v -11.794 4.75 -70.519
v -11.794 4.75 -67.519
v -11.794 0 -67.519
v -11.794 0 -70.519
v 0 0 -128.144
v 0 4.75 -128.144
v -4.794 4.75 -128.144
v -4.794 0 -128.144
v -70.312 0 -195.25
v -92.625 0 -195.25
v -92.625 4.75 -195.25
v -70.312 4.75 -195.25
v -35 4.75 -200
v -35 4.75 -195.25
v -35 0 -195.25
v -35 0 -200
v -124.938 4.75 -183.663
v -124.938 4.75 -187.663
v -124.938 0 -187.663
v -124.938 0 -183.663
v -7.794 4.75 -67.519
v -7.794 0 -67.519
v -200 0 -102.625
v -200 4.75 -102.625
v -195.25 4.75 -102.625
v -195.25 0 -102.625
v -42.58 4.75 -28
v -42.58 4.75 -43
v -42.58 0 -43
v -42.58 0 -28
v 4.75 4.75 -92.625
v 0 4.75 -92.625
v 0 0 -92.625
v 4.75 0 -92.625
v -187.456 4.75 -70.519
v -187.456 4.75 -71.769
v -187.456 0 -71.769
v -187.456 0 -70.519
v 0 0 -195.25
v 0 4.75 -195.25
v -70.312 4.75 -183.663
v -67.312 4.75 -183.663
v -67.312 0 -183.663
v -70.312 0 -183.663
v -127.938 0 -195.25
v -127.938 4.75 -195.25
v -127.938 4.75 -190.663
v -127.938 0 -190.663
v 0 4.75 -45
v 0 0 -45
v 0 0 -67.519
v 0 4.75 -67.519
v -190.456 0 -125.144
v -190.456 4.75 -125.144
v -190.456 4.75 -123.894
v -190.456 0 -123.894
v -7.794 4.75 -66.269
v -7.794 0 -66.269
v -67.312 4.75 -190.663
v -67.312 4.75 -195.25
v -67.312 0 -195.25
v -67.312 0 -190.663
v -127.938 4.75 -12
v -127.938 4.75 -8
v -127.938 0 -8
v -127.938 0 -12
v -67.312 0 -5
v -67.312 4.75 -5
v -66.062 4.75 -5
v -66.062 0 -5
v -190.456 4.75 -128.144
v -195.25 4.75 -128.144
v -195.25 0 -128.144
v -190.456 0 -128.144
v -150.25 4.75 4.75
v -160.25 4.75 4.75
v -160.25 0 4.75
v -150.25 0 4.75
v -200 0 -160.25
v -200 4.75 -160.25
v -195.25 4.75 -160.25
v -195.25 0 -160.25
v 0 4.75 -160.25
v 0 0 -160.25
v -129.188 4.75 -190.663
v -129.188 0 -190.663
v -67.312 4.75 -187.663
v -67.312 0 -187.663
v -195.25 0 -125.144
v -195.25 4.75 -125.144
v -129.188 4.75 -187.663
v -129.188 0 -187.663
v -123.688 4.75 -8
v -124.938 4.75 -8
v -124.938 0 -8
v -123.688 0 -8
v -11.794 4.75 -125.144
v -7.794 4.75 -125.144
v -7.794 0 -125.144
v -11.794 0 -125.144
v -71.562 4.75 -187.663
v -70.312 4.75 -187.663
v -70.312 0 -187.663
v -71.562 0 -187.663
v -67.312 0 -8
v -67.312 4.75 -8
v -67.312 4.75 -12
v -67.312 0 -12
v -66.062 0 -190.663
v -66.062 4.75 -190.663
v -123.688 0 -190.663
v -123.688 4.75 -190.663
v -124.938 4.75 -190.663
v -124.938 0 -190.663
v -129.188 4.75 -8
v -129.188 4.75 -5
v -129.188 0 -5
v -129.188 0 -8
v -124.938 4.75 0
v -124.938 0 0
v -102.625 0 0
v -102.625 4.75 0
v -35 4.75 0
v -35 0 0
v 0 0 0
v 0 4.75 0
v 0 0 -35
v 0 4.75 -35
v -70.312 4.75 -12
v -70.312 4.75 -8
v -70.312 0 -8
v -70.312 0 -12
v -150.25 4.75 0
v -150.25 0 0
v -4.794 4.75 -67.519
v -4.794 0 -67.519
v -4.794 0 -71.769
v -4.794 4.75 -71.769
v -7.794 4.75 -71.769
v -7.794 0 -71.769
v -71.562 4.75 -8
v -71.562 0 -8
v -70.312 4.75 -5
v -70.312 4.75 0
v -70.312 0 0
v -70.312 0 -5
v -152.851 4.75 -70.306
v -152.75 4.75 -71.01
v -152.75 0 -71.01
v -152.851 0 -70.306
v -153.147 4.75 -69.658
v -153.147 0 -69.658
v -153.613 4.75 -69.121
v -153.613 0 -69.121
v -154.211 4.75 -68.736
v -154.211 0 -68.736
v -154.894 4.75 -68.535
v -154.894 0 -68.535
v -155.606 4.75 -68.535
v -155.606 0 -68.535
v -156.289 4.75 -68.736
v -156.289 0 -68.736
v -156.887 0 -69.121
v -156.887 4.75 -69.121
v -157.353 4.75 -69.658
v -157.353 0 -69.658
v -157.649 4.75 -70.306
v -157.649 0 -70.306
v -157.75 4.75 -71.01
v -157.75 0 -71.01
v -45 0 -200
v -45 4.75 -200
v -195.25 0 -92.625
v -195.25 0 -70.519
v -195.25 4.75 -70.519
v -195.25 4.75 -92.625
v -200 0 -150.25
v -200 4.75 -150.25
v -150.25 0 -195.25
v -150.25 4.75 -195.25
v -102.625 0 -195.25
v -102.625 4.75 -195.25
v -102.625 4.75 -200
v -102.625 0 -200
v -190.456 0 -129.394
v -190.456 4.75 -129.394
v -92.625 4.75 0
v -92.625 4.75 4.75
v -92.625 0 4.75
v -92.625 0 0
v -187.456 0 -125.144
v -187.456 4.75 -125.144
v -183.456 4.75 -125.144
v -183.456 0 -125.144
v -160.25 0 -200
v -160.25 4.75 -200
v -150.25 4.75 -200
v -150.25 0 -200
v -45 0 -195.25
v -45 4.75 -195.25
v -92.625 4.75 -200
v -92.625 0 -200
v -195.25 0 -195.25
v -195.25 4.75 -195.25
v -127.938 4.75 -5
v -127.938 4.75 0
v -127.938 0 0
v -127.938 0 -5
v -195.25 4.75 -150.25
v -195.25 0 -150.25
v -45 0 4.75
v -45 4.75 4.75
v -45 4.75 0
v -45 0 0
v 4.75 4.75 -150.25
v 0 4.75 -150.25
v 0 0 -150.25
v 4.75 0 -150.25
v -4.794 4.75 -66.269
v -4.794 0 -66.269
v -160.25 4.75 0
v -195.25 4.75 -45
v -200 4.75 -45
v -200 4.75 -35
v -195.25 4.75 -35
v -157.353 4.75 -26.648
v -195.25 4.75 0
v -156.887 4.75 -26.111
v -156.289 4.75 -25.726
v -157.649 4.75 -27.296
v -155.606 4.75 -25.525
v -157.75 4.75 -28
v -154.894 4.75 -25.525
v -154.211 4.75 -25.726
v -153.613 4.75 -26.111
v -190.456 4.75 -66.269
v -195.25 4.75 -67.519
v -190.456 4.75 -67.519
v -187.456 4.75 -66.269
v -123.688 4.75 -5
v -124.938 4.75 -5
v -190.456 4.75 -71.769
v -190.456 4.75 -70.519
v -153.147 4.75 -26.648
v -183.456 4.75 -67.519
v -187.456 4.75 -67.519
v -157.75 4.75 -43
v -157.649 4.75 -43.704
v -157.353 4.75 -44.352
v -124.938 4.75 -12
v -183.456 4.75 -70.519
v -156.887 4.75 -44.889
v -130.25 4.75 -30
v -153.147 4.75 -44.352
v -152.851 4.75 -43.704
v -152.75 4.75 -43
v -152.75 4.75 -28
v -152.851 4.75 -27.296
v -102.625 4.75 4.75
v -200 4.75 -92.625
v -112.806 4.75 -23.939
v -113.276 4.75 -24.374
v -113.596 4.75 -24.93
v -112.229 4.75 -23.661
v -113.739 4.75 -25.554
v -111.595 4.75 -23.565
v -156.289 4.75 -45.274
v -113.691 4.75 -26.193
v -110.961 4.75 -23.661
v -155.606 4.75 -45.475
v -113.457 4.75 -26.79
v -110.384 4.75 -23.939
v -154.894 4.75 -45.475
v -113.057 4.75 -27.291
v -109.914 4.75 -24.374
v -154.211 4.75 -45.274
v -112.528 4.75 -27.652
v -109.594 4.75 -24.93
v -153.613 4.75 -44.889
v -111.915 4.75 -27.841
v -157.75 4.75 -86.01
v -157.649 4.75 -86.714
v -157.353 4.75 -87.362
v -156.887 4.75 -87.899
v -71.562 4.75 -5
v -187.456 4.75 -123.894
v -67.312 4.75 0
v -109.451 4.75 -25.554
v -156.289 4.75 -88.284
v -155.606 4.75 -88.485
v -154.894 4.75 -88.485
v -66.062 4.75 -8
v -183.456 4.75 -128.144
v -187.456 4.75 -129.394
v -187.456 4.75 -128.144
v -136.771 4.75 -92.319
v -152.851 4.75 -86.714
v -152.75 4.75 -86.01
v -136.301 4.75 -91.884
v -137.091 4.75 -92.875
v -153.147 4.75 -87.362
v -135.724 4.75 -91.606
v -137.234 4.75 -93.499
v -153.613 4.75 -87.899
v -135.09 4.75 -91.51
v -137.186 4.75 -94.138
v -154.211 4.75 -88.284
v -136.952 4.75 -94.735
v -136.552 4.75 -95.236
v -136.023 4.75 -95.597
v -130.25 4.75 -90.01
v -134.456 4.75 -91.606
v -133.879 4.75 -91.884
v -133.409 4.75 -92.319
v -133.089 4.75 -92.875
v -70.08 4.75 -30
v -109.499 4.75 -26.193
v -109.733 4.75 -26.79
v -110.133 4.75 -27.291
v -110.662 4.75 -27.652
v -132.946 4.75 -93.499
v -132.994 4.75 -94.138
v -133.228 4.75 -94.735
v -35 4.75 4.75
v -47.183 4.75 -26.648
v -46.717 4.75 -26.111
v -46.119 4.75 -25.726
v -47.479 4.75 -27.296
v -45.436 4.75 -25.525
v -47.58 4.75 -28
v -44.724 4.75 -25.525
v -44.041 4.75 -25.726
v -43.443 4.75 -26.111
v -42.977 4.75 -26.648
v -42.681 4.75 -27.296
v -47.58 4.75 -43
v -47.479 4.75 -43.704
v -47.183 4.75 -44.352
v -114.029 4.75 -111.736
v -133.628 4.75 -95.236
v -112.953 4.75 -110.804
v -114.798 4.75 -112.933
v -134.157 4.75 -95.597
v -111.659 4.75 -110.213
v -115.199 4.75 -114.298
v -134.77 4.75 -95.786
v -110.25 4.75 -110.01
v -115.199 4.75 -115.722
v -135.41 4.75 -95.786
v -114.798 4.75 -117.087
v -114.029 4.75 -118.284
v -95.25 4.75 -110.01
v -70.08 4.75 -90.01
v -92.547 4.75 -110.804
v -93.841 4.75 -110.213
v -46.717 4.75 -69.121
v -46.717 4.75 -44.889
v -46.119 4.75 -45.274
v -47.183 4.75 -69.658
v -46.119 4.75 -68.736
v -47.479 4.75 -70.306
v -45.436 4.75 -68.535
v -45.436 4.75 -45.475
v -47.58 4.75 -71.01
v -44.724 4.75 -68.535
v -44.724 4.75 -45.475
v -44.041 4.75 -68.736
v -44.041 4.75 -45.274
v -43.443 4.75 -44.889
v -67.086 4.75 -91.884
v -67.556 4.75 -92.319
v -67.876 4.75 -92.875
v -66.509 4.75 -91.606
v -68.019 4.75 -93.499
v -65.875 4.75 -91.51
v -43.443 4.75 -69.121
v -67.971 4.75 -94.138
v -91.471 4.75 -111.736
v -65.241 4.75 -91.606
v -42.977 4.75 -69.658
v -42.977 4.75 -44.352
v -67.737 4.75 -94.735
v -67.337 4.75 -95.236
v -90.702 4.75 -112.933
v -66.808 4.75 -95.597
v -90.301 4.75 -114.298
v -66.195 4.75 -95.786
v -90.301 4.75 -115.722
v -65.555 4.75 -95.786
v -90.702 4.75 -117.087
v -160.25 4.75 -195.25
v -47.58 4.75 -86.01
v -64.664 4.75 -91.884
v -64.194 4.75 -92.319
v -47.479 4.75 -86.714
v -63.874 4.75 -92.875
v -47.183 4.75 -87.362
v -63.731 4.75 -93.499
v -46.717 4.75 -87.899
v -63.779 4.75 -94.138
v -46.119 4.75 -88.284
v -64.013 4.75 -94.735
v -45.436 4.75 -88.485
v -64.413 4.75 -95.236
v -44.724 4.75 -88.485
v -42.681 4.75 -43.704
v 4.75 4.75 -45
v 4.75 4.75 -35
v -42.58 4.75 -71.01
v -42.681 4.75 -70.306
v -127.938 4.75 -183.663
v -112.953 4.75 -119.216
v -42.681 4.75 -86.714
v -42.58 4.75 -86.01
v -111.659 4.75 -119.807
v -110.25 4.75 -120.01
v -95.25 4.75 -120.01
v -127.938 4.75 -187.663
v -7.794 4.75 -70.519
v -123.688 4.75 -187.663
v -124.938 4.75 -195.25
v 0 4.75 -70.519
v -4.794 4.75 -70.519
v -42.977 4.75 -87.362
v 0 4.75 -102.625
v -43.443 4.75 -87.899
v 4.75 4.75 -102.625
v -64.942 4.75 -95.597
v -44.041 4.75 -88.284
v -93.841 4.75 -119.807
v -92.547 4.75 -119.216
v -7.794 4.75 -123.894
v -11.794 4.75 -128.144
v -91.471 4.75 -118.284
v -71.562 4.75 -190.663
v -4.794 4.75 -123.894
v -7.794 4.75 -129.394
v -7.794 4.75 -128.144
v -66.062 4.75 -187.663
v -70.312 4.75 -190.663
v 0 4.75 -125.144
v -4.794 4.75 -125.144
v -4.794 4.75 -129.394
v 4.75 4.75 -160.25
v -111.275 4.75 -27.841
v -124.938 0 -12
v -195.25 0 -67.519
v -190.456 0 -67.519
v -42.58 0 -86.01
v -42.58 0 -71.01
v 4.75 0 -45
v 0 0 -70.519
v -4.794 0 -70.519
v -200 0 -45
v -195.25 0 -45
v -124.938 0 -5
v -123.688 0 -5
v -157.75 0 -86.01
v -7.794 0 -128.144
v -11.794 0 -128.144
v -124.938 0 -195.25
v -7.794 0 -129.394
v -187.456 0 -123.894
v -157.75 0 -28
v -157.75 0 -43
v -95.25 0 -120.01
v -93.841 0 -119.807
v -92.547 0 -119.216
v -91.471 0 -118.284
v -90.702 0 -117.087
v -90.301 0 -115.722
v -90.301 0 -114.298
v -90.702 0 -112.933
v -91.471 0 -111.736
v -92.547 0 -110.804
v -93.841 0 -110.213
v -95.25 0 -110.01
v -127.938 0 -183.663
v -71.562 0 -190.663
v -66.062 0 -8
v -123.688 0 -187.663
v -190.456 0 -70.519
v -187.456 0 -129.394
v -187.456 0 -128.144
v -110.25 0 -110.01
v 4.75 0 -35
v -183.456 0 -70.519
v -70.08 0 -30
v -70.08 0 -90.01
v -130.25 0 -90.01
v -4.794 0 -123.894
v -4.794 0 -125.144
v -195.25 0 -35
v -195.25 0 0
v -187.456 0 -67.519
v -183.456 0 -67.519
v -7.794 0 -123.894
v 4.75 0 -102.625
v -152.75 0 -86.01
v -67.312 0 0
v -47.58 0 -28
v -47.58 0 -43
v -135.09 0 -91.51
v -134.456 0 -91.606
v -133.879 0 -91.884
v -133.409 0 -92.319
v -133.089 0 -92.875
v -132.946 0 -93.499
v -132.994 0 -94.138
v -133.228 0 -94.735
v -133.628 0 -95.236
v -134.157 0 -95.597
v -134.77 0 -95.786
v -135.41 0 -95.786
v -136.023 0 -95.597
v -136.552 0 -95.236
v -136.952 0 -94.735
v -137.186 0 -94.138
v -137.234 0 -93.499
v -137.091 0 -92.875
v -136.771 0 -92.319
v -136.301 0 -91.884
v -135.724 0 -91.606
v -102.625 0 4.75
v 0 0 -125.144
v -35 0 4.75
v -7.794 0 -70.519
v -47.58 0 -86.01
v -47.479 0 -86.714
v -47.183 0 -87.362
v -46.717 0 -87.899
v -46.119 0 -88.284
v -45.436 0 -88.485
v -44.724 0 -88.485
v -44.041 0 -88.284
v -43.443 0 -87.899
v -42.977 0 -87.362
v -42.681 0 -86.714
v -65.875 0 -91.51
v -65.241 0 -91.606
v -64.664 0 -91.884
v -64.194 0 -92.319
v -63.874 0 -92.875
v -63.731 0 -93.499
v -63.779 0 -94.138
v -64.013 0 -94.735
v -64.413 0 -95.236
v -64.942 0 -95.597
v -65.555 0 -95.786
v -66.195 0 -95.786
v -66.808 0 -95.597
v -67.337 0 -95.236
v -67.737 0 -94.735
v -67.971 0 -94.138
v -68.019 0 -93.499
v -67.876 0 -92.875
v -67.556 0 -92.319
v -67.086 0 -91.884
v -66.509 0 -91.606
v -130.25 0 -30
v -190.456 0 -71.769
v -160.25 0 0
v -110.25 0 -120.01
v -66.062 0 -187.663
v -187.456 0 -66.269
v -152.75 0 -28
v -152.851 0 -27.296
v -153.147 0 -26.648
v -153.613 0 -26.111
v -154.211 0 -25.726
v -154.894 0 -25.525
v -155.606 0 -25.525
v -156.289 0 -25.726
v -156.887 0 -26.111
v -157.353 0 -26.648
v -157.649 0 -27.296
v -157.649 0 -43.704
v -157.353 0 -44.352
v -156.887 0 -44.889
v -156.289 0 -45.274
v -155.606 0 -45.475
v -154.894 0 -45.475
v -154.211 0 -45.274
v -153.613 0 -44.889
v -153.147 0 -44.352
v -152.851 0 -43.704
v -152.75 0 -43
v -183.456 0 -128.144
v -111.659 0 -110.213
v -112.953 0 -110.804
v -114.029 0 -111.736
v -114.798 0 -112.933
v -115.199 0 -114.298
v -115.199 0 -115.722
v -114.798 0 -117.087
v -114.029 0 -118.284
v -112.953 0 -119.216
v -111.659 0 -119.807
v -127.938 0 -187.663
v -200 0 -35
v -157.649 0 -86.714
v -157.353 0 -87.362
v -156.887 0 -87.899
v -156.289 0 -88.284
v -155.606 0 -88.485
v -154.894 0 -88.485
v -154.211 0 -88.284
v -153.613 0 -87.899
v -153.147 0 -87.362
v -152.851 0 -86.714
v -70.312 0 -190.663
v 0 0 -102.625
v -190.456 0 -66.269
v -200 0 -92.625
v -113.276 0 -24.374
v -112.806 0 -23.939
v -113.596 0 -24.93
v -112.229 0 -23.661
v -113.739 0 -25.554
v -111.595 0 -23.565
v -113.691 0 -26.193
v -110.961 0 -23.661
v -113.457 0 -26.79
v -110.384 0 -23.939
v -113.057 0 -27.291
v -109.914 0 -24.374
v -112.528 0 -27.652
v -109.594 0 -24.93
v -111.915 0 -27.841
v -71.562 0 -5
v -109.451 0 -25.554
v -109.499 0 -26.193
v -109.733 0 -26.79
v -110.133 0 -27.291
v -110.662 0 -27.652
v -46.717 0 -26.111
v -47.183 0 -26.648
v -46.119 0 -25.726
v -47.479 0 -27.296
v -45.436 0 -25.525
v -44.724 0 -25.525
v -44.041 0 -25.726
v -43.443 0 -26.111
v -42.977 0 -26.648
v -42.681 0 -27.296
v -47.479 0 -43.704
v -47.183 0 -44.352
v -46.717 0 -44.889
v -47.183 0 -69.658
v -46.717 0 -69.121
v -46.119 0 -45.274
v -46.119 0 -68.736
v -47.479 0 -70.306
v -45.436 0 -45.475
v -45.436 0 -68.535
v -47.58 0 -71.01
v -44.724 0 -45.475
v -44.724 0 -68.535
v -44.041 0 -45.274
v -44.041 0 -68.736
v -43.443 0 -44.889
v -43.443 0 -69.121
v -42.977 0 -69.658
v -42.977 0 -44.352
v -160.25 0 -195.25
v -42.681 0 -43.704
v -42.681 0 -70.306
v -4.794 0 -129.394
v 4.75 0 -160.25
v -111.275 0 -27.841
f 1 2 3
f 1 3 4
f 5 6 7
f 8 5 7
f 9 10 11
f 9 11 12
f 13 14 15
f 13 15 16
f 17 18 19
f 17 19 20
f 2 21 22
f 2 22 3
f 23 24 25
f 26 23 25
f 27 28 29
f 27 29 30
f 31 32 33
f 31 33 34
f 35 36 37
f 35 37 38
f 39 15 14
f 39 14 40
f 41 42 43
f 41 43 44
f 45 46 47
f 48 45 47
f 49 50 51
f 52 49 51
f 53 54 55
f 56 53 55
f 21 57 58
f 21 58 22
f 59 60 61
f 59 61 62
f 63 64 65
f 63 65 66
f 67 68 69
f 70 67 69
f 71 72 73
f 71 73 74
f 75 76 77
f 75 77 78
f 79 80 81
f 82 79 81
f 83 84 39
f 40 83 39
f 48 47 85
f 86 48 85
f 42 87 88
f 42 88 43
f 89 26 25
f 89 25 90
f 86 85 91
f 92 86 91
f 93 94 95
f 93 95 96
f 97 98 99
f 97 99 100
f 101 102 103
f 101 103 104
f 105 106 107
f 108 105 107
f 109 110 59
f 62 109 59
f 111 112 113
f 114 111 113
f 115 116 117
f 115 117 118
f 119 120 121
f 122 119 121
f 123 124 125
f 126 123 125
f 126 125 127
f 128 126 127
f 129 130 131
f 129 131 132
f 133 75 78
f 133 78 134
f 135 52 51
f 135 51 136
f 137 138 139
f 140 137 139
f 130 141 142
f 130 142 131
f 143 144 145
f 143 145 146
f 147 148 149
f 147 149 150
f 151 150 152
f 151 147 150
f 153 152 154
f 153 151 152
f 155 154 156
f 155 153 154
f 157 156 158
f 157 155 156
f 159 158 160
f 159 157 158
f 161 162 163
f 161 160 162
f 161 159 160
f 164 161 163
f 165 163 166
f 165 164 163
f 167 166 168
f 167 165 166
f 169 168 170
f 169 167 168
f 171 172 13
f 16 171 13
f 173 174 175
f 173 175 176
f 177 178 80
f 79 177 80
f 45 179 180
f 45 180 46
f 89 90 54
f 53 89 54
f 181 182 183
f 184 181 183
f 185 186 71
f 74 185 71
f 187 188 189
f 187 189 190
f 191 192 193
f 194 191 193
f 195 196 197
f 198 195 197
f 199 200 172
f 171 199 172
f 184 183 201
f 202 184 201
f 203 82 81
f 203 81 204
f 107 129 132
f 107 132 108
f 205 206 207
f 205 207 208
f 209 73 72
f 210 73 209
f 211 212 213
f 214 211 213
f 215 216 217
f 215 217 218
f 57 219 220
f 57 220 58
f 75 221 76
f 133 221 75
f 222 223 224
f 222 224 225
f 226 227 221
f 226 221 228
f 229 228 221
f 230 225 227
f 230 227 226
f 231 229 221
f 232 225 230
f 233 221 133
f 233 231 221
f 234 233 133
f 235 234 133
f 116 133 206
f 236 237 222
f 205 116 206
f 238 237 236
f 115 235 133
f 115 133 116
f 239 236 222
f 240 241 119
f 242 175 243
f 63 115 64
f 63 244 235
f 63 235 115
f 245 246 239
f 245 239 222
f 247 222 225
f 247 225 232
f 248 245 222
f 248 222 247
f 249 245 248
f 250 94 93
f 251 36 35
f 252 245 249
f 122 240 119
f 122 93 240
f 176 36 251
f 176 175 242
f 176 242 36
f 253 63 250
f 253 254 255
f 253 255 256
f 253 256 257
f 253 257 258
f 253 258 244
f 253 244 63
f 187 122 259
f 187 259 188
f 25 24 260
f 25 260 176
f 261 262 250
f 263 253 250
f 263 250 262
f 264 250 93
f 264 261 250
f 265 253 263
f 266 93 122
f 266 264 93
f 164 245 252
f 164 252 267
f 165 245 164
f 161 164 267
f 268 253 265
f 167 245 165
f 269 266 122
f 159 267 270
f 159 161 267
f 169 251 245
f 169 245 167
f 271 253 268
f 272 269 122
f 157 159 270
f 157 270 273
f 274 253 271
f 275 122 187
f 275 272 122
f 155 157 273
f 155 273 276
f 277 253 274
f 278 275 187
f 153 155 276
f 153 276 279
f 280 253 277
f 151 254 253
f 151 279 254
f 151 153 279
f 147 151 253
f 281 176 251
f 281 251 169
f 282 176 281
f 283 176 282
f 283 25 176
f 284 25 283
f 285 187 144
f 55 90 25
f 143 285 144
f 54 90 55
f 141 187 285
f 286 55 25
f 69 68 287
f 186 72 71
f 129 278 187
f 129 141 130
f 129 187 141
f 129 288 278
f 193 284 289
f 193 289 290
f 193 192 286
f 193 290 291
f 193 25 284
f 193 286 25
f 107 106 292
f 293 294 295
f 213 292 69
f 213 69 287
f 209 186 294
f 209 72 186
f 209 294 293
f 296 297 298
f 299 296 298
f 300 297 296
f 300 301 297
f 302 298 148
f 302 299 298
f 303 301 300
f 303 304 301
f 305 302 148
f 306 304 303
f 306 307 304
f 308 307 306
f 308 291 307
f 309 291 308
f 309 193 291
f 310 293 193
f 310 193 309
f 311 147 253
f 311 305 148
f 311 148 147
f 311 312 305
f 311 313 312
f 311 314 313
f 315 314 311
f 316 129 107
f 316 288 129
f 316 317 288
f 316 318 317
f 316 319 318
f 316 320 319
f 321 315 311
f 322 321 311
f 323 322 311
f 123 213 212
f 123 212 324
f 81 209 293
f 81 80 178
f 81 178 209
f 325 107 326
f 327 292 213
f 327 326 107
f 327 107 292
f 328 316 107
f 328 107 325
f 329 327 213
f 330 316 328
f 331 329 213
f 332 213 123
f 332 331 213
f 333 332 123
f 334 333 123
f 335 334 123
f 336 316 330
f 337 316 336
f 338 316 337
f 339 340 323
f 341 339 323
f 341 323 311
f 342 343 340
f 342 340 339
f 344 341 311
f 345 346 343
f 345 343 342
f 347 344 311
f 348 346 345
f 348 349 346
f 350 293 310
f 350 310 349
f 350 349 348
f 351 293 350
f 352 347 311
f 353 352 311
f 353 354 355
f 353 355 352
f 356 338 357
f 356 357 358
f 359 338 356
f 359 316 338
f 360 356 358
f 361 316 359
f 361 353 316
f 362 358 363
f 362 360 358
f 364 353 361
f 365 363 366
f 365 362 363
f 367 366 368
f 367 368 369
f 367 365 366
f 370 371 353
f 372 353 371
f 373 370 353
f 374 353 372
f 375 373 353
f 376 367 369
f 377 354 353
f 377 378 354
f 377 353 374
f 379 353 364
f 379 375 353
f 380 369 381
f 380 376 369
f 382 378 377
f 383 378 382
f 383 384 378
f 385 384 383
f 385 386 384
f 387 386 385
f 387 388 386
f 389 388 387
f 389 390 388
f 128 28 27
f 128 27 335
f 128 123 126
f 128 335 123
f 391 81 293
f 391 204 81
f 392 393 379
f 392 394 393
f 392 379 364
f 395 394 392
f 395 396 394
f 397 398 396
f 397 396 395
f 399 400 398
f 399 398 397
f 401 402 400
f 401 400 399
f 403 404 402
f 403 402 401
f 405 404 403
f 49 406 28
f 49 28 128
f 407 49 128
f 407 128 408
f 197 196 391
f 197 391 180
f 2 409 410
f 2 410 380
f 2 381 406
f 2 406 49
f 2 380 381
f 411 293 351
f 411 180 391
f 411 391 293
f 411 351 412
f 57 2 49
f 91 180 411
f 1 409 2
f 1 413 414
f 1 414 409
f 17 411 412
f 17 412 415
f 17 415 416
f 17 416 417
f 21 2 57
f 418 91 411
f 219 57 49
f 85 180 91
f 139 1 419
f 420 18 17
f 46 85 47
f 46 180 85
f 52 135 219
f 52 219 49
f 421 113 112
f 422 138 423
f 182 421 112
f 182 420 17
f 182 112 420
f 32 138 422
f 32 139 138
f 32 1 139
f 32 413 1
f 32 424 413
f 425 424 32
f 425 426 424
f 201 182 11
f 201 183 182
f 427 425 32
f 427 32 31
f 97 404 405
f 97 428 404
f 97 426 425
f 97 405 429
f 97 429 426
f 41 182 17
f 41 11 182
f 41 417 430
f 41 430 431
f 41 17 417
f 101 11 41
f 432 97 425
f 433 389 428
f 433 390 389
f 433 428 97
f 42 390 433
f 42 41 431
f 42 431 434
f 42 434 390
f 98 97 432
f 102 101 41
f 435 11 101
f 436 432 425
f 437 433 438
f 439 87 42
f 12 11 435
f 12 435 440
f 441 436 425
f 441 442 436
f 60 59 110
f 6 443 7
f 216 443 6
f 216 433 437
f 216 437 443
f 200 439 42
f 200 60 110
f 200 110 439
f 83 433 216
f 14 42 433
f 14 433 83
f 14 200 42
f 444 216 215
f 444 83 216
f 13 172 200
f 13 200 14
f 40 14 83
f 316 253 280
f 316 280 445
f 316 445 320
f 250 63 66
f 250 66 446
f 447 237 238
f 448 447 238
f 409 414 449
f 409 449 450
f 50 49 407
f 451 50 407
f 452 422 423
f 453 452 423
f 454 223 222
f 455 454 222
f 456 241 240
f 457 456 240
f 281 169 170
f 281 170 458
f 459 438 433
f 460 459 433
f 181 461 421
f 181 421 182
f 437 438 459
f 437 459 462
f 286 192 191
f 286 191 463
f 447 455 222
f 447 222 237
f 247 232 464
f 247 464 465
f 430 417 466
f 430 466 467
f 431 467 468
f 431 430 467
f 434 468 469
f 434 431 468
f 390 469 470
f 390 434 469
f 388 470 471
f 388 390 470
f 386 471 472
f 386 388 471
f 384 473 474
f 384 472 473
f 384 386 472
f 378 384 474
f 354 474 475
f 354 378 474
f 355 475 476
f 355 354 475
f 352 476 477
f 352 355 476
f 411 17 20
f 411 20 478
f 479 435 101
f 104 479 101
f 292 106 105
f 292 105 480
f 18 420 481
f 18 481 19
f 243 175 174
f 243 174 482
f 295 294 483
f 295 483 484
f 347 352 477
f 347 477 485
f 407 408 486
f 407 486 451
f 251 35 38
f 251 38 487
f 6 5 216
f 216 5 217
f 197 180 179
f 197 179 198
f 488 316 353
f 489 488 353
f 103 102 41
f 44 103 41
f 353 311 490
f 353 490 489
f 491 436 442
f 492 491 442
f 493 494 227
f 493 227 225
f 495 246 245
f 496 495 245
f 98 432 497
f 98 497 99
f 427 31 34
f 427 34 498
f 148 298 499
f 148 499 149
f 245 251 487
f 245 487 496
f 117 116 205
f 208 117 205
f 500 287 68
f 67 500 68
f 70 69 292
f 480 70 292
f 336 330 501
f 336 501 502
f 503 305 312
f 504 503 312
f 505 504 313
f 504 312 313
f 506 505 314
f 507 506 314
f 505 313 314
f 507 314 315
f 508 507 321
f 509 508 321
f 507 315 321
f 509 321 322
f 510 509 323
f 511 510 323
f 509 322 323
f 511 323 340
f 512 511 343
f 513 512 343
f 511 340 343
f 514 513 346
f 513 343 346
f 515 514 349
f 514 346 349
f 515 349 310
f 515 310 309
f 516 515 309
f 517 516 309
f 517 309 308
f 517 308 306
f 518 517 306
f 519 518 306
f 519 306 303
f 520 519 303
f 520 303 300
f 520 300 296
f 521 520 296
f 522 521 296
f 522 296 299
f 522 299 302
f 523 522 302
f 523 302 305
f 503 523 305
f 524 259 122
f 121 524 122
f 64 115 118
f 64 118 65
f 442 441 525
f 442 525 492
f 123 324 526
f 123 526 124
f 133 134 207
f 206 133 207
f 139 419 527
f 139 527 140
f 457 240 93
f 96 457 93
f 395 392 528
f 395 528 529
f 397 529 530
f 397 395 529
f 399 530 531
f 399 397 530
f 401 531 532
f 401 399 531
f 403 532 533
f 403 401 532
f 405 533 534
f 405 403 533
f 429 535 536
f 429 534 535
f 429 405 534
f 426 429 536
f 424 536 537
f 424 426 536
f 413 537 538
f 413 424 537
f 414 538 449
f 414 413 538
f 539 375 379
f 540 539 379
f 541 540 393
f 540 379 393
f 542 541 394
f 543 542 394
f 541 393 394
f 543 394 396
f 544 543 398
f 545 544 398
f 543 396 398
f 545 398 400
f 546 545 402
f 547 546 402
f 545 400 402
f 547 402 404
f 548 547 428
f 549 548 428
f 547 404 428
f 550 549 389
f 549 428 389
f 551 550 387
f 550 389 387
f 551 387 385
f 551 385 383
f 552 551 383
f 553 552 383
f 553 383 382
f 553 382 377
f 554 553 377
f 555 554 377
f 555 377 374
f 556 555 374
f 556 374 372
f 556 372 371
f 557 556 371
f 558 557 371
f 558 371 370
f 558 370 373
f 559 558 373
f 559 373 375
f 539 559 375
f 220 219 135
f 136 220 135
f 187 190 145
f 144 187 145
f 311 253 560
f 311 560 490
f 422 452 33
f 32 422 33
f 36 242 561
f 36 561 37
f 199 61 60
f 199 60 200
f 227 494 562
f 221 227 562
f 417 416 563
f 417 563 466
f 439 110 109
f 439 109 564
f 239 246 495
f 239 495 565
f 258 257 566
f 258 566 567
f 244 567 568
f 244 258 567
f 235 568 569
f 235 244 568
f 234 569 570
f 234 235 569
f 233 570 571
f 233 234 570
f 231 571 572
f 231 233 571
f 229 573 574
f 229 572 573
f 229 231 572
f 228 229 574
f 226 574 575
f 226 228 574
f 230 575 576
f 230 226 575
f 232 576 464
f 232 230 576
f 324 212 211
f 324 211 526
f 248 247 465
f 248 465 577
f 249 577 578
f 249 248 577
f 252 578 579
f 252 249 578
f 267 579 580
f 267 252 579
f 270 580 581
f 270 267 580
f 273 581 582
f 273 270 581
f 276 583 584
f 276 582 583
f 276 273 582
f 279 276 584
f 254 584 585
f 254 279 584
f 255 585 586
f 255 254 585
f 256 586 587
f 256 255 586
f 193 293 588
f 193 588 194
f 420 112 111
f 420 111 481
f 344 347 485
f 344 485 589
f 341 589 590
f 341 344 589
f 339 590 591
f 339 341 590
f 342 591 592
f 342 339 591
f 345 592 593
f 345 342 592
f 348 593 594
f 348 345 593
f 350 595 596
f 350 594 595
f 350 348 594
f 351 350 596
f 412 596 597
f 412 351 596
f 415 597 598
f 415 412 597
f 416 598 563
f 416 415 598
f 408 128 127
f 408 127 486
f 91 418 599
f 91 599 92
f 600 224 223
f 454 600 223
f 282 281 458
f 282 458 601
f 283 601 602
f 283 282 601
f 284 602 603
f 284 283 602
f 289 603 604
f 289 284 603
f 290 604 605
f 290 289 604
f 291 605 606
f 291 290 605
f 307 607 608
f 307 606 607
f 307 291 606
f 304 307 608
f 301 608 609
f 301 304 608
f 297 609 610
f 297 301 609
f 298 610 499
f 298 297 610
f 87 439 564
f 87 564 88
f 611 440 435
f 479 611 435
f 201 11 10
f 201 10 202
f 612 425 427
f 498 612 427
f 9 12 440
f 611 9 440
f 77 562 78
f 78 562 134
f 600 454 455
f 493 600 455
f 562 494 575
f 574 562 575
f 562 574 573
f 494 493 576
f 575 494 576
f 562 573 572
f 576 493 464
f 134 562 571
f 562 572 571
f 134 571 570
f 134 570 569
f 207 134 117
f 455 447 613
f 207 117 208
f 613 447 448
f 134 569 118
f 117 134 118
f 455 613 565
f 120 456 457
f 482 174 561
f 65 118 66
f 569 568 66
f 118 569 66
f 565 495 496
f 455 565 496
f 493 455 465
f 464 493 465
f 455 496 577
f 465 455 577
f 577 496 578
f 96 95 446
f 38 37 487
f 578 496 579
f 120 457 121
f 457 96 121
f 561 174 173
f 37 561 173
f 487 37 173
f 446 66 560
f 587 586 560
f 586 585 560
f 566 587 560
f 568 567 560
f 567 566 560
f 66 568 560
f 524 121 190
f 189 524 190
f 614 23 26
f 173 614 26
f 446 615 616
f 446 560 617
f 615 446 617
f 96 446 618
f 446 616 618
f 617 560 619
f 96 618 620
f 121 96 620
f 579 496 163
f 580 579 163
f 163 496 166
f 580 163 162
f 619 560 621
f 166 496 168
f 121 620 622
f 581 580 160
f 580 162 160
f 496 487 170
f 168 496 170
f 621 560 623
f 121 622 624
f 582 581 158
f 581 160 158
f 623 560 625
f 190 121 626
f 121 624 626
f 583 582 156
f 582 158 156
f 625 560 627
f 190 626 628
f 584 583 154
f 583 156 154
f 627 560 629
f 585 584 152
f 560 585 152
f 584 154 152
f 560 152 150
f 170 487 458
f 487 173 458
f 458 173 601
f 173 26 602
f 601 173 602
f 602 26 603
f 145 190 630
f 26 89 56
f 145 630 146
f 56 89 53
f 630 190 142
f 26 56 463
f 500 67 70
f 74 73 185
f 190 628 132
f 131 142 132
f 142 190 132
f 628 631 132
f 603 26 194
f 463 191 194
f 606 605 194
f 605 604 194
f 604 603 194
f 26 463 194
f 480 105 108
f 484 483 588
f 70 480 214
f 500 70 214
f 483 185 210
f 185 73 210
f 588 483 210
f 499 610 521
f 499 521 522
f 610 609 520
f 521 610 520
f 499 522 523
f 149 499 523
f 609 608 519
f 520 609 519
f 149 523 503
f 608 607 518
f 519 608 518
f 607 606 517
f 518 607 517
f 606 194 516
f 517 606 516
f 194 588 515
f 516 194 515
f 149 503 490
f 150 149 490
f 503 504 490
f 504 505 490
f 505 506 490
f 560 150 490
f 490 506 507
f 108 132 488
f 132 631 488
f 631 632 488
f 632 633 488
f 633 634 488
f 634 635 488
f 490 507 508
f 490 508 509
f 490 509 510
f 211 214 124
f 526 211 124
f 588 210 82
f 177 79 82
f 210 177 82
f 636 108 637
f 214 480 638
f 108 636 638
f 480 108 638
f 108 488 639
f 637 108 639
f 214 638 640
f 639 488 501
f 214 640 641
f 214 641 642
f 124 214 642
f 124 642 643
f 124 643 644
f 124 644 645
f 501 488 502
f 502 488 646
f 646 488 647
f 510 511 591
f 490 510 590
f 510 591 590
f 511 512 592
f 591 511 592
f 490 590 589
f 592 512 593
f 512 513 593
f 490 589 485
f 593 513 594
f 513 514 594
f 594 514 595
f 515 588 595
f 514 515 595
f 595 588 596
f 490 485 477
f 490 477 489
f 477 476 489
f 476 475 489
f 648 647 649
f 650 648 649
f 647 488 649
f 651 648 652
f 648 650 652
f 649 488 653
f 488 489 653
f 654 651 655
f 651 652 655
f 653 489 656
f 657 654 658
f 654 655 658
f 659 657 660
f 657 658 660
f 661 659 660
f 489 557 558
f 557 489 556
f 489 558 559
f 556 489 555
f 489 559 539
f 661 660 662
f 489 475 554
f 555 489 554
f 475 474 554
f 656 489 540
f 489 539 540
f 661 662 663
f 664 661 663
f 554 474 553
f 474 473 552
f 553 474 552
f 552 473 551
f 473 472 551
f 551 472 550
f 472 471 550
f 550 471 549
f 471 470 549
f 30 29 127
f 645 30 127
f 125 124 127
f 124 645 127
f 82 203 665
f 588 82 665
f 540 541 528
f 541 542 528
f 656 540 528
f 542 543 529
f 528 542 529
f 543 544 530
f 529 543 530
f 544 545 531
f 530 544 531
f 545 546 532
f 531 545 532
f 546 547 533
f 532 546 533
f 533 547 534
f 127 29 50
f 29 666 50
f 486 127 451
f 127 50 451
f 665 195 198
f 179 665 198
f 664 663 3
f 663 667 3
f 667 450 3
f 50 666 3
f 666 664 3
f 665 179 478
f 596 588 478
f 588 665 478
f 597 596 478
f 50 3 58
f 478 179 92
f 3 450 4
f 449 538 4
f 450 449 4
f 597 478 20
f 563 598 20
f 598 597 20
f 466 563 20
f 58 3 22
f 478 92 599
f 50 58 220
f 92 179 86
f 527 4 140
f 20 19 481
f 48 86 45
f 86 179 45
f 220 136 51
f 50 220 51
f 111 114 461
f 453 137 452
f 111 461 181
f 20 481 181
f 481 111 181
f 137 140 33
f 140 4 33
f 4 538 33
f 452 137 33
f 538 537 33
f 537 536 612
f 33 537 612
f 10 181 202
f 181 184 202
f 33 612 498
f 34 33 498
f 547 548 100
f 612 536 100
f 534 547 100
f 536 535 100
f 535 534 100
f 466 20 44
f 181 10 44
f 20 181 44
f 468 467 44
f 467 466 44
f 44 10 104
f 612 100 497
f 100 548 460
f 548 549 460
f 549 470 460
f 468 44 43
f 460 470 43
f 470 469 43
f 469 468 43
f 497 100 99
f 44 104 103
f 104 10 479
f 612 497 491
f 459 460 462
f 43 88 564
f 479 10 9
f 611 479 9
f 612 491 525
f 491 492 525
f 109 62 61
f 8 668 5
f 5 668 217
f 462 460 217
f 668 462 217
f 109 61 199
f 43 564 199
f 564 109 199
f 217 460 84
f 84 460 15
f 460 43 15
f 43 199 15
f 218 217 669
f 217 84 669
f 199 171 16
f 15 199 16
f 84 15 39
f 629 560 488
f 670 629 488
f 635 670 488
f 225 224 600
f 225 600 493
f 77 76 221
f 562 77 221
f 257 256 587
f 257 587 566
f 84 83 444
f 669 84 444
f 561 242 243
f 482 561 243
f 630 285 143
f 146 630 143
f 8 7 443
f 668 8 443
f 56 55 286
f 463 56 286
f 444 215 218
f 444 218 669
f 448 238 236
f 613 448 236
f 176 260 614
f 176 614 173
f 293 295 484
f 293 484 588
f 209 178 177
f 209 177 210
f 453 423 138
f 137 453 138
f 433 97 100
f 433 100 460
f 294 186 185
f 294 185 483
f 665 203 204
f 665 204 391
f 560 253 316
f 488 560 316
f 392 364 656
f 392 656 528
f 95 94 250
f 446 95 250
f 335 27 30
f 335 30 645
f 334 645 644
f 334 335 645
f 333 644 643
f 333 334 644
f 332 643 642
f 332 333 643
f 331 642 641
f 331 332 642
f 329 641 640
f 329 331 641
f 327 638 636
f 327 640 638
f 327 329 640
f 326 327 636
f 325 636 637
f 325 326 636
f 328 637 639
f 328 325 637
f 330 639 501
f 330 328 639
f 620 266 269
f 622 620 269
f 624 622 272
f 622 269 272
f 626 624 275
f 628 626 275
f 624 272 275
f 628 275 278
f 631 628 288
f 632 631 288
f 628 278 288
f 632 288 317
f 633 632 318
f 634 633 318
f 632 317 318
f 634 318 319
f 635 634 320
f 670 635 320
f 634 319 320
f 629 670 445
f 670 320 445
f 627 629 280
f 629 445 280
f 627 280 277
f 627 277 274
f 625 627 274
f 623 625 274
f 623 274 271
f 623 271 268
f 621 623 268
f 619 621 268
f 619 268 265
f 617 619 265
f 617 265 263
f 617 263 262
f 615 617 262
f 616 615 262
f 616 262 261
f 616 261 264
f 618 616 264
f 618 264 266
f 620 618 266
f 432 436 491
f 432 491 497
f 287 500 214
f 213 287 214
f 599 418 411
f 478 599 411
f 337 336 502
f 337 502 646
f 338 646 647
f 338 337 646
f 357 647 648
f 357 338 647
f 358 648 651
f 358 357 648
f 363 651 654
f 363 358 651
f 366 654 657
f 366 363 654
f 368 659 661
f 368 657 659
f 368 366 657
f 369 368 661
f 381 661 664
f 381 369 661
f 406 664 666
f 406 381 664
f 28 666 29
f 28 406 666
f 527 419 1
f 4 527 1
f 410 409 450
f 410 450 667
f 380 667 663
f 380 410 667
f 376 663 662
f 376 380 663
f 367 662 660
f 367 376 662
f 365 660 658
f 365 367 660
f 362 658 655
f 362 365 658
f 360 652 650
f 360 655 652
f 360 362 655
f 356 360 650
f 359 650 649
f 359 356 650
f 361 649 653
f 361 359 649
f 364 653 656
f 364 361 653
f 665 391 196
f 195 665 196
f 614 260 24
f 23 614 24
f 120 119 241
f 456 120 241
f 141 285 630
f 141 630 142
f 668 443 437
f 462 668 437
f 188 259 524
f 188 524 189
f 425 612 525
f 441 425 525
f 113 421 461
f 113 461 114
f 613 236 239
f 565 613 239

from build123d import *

# Parameters (mm, degrees)
SKETCH1_W           = 195.25
SKETCH1_H           = 195.25
BOSS_EXTRUDE1_DEPTH = 4.75
SKETCH2_W           = 10
SKETCH2_H           = 4.75
SKETCH2_W_2         = 4.75
SKETCH2_H_2         = 10
BOSS_EXTRUDE2_DEPTH = 4.75
SKETCH3_W           = 3
SKETCH3_H           = 12
SKETCH3_W_2         = 5.5
SKETCH3_H_2         = 3
CUT_EXTRUDE1_DEPTH  = 4.75
CIRPATTERN1_COUNT   = 4
SKETCH4_R           = 2.15
SKETCH4_W           = 60.17
SKETCH4_H           = 60.01
CUT_EXTRUDE2_DEPTH  = 283.882594905


with BuildPart() as part:
    # Sketch1 → Boss-Extrude1 (new body)
    with BuildSketch(Plane(origin=(0, 0, 0), x_dir=(1, 0, 0), z_dir=(0, 1, 0))):
        with Locations((-97.625, 97.625)):
            Rectangle(SKETCH1_W, SKETCH1_H)
    extrude(amount=BOSS_EXTRUDE1_DEPTH)

    # Sketch2 → Boss-Extrude2 (add)
    with BuildSketch(Plane(origin=(0, 4.75, 0), x_dir=(1, 0, 0), z_dir=(0, 1, 0))):
        with Locations((-155.25, 197.625)):
            Rectangle(SKETCH2_W, SKETCH2_H)
        with Locations((-97.625, 197.625)):
            Rectangle(SKETCH2_W, SKETCH2_H)
        with Locations((-40, 197.625)):
            Rectangle(SKETCH2_W, SKETCH2_H)
        with Locations((2.375, 155.25)):
            Rectangle(SKETCH2_W_2, SKETCH2_H_2)
        with Locations((2.375, 97.625)):
            Rectangle(SKETCH2_W_2, SKETCH2_H_2)
        with Locations((2.375, 40)):
            Rectangle(SKETCH2_W_2, SKETCH2_H_2)
        with Locations((-40, -2.375)):
            Rectangle(SKETCH2_W, SKETCH2_H)
        with Locations((-97.625, -2.375)):
            Rectangle(SKETCH2_W, SKETCH2_H)
        with Locations((-155.25, -2.375)):
            Rectangle(SKETCH2_W, SKETCH2_H)
        with Locations((-197.625, 40)):
            Rectangle(SKETCH2_W_2, SKETCH2_H_2)
        with Locations((-197.625, 97.625)):
            Rectangle(SKETCH2_W_2, SKETCH2_H_2)
        with Locations((-197.625, 155.25)):
            Rectangle(SKETCH2_W_2, SKETCH2_H_2)
    extrude(amount=-BOSS_EXTRUDE2_DEPTH)

    # Sketch3 → Cut-Extrude1 (cut)
    with BuildSketch(Plane(origin=(0, 4.75, 0), x_dir=(1, 0, 0), z_dir=(0, 1, 0))):
        with Locations((-126.4375, 6)):
            Rectangle(SKETCH3_W, SKETCH3_H)
        with Locations((-126.4375, 6.5)):
            Rectangle(SKETCH3_W_2, SKETCH3_H_2)
        with Locations((-68.8125, 6)):
            Rectangle(SKETCH3_W, SKETCH3_H)
        with Locations((-68.8125, 6.5)):
            Rectangle(SKETCH3_W_2, SKETCH3_H_2)
    cut_extrude1 = extrude(amount=-CUT_EXTRUDE1_DEPTH, mode=Mode.SUBTRACT)

    # CirPattern1: Cut-Extrude1 ×4 about axis
    cirpattern1_axis = Axis((-97.625, 0, -97.831288278), (0, 1, 0))
    for i in range(1, CIRPATTERN1_COUNT):
        add(cut_extrude1.rotate(cirpattern1_axis, i * 360 / CIRPATTERN1_COUNT), mode=Mode.SUBTRACT)

    # Sketch4 → Cut-Extrude2 (cut, through all)
    with BuildSketch(Plane(origin=(0, 4.75, 0), x_dir=(1, 0, 0), z_dir=(0, 1, 0))):
        with Locations(Location((-111.595, 25.715, 0), (0, 0, 270))):
            Circle(SKETCH4_R)
        with Locations(Location((-65.875, 93.66, 0), (0, 0, 270))):
            Circle(SKETCH4_R)
        with Locations(Location((-135.09, 93.66, 0), (0, 0, 270))):
            Circle(SKETCH4_R)
        with Locations((-100.165, 60.005)):
            Rectangle(SKETCH4_W, SKETCH4_H)
        with BuildLine():
            Line((-152.75, 43), (-152.75, 28))
            ThreePointArc((-152.75, 28), (-155.25, 25.5), (-157.75, 28))
            Line((-157.75, 28), (-157.75, 43))
            ThreePointArc((-157.75, 43), (-155.25, 45.5), (-152.75, 43))
        make_face()
        with BuildLine():
            Line((-42.58, 43), (-42.58, 28))
            ThreePointArc((-42.58, 28), (-45.08, 25.5), (-47.58, 28))
            Line((-47.58, 28), (-47.58, 43))
            ThreePointArc((-47.58, 43), (-45.08, 45.5), (-42.58, 43))
        make_face()
        with BuildLine():
            Line((-42.58, 86.01), (-42.58, 71.01))
            ThreePointArc((-42.58, 71.01), (-45.08, 68.51), (-47.58, 71.01))
            Line((-47.58, 71.01), (-47.58, 86.01))
            ThreePointArc((-47.58, 86.01), (-45.08, 88.51), (-42.58, 86.01))
        make_face()
        with BuildLine():
            Line((-110.25, 120.01), (-95.25, 120.01))
            ThreePointArc((-95.25, 120.01), (-90.25, 115.01), (-95.25, 110.01))
            Line((-95.25, 110.01), (-110.25, 110.01))
            ThreePointArc((-110.25, 110.01), (-115.25, 115.01), (-110.25, 120.01))
        make_face()
        with BuildLine():
            Line((-152.75, 86.01), (-152.75, 71.01))
            ThreePointArc((-152.75, 71.01), (-155.25, 68.51), (-157.75, 71.01))
            Line((-157.75, 71.01), (-157.75, 86.01))
            ThreePointArc((-157.75, 86.01), (-155.25, 88.51), (-152.75, 86.01))
        make_face()
    extrude(amount=-CUT_EXTRUDE2_DEPTH, mode=Mode.SUBTRACT)


solid = part.part
